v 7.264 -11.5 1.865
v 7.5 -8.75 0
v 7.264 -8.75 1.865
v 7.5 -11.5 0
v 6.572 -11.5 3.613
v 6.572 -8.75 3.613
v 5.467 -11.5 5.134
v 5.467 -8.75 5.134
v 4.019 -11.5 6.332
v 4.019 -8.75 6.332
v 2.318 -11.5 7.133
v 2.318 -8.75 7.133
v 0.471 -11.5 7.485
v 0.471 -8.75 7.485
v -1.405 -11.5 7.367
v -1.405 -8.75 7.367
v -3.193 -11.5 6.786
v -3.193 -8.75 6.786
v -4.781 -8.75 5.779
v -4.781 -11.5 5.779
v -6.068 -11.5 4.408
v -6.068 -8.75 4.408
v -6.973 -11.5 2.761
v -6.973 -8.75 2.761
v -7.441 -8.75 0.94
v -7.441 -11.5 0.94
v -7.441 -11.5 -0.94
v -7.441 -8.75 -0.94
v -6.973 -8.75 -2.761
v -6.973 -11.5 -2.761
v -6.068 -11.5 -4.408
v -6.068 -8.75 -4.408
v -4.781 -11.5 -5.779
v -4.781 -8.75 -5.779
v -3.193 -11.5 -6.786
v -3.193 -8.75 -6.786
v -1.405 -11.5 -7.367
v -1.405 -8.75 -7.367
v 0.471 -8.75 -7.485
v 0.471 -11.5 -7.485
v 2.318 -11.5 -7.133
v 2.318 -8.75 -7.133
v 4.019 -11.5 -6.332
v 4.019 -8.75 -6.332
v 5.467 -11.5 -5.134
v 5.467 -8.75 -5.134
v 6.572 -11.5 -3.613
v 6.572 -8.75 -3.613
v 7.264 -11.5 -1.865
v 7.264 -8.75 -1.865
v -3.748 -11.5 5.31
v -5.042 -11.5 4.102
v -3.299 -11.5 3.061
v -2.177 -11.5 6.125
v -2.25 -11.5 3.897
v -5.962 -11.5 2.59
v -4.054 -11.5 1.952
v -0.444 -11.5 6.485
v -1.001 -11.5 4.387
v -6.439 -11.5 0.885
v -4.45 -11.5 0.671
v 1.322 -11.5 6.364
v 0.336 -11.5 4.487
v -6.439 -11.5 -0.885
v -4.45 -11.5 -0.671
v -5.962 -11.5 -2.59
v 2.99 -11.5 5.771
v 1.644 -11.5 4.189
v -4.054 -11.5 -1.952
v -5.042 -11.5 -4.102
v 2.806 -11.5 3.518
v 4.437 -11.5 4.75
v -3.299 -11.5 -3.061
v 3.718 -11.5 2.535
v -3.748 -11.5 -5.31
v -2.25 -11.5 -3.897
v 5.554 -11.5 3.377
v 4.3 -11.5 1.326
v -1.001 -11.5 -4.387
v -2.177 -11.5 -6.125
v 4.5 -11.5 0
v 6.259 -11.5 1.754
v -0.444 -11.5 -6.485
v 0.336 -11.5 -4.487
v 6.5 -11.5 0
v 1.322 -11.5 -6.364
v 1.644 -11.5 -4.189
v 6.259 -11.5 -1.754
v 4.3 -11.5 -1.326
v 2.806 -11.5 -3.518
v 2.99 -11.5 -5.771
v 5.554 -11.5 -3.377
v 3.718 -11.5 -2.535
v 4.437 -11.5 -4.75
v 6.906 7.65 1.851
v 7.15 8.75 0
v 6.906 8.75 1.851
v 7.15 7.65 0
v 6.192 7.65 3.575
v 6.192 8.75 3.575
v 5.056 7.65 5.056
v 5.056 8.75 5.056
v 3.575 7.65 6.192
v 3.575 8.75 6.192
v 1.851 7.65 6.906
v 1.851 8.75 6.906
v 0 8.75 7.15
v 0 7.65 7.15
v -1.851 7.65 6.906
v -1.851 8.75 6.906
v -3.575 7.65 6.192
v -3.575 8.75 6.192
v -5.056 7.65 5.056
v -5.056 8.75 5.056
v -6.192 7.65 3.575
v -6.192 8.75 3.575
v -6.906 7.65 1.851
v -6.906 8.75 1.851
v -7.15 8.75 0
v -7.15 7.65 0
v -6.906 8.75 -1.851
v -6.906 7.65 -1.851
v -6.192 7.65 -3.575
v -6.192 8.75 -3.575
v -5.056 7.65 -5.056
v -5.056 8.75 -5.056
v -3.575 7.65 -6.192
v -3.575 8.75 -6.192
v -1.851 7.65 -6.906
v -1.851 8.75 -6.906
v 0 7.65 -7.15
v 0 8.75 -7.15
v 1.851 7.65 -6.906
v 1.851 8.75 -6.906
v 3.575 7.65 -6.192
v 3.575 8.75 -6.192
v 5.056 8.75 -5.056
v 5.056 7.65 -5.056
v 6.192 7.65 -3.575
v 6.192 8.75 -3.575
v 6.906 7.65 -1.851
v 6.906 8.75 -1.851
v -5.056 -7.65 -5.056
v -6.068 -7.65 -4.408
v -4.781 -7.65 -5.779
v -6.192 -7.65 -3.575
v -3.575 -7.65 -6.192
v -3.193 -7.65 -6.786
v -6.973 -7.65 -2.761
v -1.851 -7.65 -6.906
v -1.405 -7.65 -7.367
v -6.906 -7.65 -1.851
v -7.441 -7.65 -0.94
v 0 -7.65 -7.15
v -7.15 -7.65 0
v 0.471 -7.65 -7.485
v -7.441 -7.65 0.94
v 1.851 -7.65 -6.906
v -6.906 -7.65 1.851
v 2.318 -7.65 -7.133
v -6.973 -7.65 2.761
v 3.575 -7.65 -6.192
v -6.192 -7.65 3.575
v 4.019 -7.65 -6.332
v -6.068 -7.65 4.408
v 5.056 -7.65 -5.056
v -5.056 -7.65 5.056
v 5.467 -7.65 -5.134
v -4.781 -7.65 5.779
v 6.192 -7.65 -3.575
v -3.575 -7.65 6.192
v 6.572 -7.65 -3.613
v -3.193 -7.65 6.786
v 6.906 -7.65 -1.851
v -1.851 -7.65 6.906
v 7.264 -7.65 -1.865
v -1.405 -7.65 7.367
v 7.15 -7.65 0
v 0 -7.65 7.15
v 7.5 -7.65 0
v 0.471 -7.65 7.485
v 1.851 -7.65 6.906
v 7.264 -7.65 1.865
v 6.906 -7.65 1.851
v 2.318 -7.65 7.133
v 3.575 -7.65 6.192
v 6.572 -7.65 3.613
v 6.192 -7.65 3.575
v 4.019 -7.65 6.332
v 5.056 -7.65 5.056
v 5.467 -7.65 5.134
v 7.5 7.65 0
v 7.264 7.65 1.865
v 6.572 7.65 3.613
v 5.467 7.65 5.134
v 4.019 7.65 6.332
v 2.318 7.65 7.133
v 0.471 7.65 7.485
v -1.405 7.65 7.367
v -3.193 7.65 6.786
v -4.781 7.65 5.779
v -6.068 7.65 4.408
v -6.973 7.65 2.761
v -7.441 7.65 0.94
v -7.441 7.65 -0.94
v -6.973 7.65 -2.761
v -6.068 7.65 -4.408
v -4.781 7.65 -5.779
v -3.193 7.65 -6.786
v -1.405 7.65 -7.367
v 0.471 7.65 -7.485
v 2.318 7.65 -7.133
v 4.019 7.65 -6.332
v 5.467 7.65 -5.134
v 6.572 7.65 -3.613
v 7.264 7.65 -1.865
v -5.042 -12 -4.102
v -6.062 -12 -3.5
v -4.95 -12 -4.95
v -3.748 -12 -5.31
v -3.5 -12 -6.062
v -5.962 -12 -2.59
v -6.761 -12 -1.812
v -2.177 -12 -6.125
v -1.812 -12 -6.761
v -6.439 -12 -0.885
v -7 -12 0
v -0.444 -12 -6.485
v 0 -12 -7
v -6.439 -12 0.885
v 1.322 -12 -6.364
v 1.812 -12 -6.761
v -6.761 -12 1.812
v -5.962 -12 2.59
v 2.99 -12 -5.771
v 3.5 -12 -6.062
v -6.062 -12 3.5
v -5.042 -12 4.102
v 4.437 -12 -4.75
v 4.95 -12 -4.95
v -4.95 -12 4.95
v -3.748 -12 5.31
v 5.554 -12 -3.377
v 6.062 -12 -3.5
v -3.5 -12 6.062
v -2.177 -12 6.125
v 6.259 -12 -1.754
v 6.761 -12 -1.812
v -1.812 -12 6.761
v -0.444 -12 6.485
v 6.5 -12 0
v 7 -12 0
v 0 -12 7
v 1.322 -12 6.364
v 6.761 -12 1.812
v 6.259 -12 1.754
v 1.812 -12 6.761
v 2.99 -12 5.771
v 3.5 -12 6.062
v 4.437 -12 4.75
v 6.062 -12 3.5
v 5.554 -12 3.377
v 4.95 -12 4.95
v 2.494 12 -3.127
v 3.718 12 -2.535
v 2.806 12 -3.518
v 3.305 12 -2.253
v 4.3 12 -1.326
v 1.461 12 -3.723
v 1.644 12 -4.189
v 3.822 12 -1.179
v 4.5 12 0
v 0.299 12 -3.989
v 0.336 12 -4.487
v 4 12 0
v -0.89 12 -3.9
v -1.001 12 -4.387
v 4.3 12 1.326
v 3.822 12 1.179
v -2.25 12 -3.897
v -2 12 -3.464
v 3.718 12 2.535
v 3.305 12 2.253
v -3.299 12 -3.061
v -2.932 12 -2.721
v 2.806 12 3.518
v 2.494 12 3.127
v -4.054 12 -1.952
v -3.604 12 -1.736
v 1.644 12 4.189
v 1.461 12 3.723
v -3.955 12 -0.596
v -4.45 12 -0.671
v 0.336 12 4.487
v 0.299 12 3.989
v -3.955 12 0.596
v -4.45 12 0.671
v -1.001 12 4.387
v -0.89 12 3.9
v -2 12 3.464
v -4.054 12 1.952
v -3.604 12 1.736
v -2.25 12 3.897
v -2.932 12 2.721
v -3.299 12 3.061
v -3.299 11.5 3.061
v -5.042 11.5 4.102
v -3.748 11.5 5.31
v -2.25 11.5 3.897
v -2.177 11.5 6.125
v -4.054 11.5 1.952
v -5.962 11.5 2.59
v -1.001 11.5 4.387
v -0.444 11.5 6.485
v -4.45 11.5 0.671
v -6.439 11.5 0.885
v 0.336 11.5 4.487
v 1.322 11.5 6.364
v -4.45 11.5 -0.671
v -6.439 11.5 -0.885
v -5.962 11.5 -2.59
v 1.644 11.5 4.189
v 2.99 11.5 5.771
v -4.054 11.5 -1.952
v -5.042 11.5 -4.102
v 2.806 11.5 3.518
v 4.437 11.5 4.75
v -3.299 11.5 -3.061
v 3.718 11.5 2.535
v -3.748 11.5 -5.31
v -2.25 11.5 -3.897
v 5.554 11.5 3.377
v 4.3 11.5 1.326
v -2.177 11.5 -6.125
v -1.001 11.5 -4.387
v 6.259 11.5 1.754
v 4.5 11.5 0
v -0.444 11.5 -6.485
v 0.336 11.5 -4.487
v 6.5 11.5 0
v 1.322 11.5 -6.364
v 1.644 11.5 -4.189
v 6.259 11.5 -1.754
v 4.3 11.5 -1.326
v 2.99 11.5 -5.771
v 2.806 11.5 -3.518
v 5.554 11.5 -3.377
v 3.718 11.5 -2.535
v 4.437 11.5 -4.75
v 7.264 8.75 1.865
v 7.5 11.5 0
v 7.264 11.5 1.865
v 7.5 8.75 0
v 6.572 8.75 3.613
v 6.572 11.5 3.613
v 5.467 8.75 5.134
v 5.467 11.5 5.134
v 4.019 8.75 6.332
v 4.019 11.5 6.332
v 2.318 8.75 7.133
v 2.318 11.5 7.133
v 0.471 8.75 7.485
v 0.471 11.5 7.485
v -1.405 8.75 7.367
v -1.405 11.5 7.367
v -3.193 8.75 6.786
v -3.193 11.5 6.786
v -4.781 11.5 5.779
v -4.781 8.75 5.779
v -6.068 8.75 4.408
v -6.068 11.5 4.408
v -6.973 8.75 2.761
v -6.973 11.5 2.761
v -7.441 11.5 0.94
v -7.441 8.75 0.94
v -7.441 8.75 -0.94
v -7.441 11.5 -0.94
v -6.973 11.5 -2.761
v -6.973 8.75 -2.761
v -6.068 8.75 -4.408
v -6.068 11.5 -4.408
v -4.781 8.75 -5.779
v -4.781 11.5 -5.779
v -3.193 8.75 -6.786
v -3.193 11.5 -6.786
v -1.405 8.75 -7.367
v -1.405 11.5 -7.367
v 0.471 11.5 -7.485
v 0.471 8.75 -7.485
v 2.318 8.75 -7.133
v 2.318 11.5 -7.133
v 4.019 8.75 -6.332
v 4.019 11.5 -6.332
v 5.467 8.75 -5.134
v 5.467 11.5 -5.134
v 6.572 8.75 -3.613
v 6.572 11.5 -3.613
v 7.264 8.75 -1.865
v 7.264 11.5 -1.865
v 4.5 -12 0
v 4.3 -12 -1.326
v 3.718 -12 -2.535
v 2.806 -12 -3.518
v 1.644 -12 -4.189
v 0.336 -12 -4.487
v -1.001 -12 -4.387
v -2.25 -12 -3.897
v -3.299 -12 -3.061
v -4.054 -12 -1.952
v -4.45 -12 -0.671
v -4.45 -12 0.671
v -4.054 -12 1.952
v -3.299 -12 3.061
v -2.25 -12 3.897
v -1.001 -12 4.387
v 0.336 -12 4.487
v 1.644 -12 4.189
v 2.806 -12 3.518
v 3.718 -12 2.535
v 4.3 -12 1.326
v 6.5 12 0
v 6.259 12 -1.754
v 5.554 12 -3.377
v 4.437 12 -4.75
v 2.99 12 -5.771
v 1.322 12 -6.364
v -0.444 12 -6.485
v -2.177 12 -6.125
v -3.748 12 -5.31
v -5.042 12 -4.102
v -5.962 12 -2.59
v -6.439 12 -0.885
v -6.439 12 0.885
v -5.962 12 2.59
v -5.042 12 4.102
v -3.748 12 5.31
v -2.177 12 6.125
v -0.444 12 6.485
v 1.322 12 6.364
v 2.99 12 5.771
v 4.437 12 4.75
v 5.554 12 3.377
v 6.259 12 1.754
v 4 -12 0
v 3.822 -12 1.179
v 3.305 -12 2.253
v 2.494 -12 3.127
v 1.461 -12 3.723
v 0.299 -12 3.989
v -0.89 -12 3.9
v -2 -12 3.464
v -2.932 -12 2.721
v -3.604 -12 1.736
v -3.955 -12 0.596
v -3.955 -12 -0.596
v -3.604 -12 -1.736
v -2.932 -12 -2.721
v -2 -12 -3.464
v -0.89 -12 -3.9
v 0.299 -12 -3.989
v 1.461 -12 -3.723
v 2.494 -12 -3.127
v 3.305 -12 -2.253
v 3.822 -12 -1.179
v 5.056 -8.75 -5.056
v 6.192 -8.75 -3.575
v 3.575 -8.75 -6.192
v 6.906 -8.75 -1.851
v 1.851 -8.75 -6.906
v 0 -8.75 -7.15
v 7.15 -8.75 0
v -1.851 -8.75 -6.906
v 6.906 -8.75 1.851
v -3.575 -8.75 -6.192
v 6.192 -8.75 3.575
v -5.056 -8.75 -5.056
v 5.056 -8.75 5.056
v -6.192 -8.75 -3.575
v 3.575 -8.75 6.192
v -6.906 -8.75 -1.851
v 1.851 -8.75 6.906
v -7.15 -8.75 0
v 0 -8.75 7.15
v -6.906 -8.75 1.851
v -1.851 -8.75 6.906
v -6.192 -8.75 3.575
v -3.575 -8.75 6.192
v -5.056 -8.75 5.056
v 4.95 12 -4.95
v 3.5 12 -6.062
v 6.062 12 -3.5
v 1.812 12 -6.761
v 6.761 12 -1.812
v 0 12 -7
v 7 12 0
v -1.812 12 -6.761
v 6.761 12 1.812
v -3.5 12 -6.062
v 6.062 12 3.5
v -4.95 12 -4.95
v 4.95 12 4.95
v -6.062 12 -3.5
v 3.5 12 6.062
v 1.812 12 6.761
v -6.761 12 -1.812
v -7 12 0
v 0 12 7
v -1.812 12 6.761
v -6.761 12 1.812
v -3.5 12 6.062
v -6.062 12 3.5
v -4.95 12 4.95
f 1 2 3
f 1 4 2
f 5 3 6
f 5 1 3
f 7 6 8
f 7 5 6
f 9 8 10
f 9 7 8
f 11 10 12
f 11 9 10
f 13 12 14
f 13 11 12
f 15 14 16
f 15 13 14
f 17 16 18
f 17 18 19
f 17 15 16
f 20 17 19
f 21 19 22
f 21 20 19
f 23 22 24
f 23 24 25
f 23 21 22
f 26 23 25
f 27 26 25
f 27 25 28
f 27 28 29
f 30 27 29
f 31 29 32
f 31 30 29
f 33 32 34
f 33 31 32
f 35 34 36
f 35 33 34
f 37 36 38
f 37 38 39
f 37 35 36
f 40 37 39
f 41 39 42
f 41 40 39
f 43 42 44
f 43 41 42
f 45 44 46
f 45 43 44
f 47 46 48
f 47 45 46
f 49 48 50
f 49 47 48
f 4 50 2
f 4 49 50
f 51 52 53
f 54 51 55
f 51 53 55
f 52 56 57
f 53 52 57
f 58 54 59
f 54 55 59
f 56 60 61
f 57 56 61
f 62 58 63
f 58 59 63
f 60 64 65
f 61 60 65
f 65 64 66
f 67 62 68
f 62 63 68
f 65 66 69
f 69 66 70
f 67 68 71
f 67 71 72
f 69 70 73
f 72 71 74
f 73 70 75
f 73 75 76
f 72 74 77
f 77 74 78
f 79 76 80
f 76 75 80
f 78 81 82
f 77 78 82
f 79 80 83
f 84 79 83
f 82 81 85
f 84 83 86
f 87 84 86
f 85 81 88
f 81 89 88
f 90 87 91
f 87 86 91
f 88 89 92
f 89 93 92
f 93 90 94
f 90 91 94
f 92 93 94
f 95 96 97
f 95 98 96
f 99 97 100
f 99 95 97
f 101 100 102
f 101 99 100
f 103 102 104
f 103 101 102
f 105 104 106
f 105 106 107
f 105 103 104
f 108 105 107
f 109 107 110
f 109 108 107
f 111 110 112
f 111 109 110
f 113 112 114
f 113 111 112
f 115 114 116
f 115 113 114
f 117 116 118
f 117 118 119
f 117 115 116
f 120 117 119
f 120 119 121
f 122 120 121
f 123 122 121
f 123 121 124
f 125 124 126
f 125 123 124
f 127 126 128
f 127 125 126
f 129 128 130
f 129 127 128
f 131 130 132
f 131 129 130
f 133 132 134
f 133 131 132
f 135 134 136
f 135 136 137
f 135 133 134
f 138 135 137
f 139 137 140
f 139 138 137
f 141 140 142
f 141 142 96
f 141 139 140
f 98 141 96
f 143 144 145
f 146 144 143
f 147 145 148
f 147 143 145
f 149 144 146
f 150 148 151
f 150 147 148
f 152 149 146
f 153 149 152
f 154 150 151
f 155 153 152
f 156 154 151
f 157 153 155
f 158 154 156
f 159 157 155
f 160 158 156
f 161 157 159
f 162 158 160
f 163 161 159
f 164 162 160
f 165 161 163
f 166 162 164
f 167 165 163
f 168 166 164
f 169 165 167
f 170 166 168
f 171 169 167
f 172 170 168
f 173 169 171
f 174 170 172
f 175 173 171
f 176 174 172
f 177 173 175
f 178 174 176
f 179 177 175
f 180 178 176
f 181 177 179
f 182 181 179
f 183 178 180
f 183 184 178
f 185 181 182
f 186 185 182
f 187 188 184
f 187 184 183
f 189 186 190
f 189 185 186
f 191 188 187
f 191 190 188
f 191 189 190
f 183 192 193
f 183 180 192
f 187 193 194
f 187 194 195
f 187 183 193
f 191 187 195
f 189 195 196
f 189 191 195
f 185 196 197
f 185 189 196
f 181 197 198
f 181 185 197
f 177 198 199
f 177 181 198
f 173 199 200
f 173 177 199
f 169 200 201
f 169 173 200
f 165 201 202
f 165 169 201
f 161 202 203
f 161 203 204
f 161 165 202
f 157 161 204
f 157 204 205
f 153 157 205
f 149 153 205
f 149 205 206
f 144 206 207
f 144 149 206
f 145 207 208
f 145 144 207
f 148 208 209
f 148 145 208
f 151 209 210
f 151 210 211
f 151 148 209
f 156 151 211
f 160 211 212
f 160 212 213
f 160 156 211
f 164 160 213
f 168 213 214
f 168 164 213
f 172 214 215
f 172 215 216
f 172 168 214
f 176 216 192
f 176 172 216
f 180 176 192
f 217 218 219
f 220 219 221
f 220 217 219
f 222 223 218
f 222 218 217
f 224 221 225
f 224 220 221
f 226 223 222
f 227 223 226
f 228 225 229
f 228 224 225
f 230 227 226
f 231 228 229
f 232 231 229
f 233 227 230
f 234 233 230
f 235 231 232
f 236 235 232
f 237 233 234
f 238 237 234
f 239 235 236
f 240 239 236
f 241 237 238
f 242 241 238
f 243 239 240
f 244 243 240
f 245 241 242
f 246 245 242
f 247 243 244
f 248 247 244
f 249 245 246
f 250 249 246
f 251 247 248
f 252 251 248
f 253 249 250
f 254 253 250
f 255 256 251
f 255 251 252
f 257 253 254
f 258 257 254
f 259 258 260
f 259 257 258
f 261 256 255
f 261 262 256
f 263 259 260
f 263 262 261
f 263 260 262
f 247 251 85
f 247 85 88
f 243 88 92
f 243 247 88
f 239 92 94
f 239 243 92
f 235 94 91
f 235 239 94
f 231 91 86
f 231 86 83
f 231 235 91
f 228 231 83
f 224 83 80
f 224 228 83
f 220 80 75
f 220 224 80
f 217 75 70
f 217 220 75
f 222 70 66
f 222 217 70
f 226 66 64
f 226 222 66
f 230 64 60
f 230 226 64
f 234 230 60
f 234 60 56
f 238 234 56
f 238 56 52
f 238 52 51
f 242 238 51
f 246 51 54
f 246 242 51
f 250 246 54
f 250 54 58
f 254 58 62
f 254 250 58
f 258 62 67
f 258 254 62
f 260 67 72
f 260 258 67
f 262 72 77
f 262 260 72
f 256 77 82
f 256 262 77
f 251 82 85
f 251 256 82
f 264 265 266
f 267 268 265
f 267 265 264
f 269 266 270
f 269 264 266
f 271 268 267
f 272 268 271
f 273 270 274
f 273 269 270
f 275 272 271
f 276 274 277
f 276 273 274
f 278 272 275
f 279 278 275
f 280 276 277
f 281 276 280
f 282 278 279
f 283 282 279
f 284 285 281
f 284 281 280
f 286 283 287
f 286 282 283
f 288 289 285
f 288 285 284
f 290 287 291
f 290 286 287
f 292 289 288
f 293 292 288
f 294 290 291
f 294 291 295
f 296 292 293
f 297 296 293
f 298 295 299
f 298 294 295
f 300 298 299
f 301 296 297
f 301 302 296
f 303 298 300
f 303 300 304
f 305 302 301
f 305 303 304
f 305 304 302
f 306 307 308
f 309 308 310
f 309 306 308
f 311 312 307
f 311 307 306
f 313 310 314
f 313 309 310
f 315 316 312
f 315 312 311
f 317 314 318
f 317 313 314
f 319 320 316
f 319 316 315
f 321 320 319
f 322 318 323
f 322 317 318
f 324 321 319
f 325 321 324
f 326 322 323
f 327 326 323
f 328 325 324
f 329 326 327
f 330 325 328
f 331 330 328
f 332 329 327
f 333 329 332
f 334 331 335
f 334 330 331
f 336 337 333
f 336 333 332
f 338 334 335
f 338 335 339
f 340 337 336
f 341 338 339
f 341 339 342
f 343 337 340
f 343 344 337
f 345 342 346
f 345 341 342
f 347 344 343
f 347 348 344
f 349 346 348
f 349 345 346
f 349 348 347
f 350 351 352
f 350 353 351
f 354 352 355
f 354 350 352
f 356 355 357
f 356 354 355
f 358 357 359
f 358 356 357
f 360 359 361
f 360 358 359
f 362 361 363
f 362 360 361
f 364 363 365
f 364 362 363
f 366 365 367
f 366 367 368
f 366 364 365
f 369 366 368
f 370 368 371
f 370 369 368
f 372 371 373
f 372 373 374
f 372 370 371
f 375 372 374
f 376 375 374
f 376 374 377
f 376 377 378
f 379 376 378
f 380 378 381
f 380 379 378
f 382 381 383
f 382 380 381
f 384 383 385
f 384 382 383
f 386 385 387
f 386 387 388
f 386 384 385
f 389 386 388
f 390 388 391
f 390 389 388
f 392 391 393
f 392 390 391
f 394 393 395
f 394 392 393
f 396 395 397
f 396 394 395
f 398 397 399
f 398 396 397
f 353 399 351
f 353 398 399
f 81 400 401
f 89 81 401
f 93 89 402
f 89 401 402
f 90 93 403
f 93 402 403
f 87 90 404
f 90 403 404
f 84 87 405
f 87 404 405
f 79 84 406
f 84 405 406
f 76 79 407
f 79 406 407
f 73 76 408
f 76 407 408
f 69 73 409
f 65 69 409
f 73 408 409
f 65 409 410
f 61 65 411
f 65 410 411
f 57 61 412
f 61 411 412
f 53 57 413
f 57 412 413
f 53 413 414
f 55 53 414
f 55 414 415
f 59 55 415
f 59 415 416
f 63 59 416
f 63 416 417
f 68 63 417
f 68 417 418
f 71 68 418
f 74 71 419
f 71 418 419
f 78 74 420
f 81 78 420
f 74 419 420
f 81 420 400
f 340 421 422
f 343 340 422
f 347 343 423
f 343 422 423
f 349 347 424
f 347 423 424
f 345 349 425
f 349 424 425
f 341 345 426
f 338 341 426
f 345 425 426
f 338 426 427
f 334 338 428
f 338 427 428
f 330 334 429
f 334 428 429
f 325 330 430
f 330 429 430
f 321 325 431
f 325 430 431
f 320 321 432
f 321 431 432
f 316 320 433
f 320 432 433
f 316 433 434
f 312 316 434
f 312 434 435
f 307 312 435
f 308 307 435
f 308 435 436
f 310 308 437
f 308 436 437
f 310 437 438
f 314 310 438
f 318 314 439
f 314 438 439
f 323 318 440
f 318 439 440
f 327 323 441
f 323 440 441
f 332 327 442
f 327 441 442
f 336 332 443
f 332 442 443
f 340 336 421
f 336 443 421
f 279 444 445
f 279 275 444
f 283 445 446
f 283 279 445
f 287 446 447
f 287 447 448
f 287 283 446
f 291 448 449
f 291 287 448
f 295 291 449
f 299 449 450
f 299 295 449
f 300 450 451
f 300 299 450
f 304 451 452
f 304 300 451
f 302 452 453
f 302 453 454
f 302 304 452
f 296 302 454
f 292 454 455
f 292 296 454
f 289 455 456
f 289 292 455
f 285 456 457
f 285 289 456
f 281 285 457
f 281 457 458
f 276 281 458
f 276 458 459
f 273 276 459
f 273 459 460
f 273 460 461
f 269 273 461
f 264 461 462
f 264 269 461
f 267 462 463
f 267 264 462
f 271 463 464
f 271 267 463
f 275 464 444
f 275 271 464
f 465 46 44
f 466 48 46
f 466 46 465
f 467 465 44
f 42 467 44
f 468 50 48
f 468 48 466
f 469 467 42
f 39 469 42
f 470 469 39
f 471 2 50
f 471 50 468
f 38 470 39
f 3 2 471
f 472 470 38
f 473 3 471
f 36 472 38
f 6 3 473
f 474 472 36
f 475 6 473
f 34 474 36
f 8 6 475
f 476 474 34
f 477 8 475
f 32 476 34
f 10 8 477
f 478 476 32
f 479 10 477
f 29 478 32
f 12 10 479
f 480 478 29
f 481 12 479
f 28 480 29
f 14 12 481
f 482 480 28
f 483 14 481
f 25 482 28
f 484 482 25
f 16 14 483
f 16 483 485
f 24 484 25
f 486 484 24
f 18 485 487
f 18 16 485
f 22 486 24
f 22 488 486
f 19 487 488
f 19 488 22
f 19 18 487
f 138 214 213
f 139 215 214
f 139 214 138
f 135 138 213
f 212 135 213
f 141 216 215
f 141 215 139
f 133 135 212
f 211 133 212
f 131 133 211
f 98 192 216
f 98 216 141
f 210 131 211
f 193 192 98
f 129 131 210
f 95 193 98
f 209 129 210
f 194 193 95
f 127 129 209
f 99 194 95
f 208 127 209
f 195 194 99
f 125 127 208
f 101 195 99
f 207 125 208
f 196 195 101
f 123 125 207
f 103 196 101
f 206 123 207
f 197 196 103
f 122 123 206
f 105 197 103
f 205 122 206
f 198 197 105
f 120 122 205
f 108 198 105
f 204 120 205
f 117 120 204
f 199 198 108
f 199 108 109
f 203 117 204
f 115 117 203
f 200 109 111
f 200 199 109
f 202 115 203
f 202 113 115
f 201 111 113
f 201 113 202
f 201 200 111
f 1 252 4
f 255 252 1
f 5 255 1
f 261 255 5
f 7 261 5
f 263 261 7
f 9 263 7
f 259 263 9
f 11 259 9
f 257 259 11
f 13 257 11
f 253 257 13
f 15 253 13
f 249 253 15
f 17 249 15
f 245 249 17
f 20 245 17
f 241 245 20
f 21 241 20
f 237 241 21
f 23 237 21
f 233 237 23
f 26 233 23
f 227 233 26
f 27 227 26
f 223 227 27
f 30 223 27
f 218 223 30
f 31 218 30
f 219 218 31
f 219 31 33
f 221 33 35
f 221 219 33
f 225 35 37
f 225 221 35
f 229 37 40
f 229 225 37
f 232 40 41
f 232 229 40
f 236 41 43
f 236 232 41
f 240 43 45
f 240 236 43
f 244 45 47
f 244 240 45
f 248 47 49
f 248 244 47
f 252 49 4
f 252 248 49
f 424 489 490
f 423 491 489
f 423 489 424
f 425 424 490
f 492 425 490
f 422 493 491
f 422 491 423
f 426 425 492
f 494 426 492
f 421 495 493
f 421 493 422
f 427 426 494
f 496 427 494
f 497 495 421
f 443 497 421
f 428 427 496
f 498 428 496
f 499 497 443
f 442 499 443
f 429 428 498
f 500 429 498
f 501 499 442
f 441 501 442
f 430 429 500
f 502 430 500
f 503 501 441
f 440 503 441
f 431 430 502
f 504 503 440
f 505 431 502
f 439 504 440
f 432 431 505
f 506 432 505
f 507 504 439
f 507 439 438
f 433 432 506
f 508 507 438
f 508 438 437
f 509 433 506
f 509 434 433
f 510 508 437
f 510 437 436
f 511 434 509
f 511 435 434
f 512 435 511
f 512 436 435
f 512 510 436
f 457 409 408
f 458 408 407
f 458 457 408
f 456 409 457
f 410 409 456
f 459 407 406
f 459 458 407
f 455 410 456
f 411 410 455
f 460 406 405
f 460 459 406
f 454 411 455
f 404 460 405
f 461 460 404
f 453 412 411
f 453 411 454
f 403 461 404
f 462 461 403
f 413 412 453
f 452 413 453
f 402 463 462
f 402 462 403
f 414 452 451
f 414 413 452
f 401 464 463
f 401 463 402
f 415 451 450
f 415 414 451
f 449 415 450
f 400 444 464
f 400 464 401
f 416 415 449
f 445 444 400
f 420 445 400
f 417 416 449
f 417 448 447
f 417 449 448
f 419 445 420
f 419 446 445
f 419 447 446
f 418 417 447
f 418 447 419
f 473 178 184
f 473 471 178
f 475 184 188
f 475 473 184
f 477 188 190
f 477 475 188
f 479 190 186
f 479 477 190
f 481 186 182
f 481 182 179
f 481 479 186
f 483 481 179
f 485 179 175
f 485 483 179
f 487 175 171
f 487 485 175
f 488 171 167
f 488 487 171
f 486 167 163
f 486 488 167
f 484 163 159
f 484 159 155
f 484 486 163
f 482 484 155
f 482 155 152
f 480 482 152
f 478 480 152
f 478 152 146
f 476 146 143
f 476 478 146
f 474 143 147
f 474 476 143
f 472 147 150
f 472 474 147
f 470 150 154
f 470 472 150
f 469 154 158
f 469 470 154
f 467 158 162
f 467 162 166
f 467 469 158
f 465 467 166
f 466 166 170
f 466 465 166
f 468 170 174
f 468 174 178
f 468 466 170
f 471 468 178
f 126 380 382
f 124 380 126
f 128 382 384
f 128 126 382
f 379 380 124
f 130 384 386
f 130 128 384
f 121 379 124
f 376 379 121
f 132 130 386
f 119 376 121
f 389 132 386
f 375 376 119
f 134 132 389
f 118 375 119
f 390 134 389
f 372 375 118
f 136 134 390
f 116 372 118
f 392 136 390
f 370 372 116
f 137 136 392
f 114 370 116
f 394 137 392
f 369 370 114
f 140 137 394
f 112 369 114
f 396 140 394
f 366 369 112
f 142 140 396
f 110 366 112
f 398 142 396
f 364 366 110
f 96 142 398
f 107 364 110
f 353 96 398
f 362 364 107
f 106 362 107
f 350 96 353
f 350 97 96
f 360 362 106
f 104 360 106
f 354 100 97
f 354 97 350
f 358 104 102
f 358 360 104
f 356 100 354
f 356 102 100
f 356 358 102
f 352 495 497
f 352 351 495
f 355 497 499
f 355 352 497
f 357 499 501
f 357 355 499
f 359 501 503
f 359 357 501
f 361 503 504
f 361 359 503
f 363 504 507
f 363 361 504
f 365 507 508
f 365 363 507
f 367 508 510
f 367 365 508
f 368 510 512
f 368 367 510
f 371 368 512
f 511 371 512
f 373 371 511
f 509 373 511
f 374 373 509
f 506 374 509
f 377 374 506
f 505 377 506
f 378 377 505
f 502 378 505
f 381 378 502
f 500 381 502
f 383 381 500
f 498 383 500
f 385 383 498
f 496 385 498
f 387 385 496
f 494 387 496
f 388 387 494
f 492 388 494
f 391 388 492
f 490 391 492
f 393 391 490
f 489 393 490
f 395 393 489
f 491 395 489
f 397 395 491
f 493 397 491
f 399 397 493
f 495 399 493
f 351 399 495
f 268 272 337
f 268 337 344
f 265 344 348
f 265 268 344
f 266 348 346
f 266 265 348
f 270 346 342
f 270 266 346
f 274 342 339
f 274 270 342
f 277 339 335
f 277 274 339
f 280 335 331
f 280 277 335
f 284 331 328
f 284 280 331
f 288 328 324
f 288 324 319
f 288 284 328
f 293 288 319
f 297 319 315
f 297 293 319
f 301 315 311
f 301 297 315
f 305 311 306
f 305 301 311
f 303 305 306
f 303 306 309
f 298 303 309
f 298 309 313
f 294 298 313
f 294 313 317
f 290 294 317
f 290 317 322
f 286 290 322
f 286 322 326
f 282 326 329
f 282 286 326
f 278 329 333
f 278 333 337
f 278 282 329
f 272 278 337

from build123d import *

# Parameters (mm, degrees)
SKETCH2_R          = 6.5
SKETCH2_R_2        = 4.5
CUT_EXTRUDE1_DEPTH = 0.5


with BuildPart() as part:
    # Sketch1 → Body (revolve)
    with BuildSketch(Plane.XY):
        Polygon((4, -12), (4, 12), (7, 12), (7.5, 11.5), (7.5, 8.75), (7.15, 8.75), (7.15, 7.65), (7.5, 7.65), (7.5, -7.65), (7.15, -7.65), (7.15, -8.75), (7.5, -8.75), (7.5, -11.5), (7, -12), align=None)
    revolve(axis=Axis((0, 12, 0), (0, -1, 0)))

    # Sketch2 → Cut-Extrude1 (cut)
    with BuildSketch(Plane(origin=(0, 12, 0), x_dir=(1, 0, 0), z_dir=(0, 1, 0))):
        Circle(SKETCH2_R)
        Circle(SKETCH2_R_2, mode=Mode.SUBTRACT)
    cut_extrude1 = extrude(amount=-CUT_EXTRUDE1_DEPTH, mode=Mode.SUBTRACT)

    # Mirror1: Cut-Extrude1 across plane
    add(cut_extrude1.mirror(Plane.ZX), mode=Mode.SUBTRACT)


solid = part.part
